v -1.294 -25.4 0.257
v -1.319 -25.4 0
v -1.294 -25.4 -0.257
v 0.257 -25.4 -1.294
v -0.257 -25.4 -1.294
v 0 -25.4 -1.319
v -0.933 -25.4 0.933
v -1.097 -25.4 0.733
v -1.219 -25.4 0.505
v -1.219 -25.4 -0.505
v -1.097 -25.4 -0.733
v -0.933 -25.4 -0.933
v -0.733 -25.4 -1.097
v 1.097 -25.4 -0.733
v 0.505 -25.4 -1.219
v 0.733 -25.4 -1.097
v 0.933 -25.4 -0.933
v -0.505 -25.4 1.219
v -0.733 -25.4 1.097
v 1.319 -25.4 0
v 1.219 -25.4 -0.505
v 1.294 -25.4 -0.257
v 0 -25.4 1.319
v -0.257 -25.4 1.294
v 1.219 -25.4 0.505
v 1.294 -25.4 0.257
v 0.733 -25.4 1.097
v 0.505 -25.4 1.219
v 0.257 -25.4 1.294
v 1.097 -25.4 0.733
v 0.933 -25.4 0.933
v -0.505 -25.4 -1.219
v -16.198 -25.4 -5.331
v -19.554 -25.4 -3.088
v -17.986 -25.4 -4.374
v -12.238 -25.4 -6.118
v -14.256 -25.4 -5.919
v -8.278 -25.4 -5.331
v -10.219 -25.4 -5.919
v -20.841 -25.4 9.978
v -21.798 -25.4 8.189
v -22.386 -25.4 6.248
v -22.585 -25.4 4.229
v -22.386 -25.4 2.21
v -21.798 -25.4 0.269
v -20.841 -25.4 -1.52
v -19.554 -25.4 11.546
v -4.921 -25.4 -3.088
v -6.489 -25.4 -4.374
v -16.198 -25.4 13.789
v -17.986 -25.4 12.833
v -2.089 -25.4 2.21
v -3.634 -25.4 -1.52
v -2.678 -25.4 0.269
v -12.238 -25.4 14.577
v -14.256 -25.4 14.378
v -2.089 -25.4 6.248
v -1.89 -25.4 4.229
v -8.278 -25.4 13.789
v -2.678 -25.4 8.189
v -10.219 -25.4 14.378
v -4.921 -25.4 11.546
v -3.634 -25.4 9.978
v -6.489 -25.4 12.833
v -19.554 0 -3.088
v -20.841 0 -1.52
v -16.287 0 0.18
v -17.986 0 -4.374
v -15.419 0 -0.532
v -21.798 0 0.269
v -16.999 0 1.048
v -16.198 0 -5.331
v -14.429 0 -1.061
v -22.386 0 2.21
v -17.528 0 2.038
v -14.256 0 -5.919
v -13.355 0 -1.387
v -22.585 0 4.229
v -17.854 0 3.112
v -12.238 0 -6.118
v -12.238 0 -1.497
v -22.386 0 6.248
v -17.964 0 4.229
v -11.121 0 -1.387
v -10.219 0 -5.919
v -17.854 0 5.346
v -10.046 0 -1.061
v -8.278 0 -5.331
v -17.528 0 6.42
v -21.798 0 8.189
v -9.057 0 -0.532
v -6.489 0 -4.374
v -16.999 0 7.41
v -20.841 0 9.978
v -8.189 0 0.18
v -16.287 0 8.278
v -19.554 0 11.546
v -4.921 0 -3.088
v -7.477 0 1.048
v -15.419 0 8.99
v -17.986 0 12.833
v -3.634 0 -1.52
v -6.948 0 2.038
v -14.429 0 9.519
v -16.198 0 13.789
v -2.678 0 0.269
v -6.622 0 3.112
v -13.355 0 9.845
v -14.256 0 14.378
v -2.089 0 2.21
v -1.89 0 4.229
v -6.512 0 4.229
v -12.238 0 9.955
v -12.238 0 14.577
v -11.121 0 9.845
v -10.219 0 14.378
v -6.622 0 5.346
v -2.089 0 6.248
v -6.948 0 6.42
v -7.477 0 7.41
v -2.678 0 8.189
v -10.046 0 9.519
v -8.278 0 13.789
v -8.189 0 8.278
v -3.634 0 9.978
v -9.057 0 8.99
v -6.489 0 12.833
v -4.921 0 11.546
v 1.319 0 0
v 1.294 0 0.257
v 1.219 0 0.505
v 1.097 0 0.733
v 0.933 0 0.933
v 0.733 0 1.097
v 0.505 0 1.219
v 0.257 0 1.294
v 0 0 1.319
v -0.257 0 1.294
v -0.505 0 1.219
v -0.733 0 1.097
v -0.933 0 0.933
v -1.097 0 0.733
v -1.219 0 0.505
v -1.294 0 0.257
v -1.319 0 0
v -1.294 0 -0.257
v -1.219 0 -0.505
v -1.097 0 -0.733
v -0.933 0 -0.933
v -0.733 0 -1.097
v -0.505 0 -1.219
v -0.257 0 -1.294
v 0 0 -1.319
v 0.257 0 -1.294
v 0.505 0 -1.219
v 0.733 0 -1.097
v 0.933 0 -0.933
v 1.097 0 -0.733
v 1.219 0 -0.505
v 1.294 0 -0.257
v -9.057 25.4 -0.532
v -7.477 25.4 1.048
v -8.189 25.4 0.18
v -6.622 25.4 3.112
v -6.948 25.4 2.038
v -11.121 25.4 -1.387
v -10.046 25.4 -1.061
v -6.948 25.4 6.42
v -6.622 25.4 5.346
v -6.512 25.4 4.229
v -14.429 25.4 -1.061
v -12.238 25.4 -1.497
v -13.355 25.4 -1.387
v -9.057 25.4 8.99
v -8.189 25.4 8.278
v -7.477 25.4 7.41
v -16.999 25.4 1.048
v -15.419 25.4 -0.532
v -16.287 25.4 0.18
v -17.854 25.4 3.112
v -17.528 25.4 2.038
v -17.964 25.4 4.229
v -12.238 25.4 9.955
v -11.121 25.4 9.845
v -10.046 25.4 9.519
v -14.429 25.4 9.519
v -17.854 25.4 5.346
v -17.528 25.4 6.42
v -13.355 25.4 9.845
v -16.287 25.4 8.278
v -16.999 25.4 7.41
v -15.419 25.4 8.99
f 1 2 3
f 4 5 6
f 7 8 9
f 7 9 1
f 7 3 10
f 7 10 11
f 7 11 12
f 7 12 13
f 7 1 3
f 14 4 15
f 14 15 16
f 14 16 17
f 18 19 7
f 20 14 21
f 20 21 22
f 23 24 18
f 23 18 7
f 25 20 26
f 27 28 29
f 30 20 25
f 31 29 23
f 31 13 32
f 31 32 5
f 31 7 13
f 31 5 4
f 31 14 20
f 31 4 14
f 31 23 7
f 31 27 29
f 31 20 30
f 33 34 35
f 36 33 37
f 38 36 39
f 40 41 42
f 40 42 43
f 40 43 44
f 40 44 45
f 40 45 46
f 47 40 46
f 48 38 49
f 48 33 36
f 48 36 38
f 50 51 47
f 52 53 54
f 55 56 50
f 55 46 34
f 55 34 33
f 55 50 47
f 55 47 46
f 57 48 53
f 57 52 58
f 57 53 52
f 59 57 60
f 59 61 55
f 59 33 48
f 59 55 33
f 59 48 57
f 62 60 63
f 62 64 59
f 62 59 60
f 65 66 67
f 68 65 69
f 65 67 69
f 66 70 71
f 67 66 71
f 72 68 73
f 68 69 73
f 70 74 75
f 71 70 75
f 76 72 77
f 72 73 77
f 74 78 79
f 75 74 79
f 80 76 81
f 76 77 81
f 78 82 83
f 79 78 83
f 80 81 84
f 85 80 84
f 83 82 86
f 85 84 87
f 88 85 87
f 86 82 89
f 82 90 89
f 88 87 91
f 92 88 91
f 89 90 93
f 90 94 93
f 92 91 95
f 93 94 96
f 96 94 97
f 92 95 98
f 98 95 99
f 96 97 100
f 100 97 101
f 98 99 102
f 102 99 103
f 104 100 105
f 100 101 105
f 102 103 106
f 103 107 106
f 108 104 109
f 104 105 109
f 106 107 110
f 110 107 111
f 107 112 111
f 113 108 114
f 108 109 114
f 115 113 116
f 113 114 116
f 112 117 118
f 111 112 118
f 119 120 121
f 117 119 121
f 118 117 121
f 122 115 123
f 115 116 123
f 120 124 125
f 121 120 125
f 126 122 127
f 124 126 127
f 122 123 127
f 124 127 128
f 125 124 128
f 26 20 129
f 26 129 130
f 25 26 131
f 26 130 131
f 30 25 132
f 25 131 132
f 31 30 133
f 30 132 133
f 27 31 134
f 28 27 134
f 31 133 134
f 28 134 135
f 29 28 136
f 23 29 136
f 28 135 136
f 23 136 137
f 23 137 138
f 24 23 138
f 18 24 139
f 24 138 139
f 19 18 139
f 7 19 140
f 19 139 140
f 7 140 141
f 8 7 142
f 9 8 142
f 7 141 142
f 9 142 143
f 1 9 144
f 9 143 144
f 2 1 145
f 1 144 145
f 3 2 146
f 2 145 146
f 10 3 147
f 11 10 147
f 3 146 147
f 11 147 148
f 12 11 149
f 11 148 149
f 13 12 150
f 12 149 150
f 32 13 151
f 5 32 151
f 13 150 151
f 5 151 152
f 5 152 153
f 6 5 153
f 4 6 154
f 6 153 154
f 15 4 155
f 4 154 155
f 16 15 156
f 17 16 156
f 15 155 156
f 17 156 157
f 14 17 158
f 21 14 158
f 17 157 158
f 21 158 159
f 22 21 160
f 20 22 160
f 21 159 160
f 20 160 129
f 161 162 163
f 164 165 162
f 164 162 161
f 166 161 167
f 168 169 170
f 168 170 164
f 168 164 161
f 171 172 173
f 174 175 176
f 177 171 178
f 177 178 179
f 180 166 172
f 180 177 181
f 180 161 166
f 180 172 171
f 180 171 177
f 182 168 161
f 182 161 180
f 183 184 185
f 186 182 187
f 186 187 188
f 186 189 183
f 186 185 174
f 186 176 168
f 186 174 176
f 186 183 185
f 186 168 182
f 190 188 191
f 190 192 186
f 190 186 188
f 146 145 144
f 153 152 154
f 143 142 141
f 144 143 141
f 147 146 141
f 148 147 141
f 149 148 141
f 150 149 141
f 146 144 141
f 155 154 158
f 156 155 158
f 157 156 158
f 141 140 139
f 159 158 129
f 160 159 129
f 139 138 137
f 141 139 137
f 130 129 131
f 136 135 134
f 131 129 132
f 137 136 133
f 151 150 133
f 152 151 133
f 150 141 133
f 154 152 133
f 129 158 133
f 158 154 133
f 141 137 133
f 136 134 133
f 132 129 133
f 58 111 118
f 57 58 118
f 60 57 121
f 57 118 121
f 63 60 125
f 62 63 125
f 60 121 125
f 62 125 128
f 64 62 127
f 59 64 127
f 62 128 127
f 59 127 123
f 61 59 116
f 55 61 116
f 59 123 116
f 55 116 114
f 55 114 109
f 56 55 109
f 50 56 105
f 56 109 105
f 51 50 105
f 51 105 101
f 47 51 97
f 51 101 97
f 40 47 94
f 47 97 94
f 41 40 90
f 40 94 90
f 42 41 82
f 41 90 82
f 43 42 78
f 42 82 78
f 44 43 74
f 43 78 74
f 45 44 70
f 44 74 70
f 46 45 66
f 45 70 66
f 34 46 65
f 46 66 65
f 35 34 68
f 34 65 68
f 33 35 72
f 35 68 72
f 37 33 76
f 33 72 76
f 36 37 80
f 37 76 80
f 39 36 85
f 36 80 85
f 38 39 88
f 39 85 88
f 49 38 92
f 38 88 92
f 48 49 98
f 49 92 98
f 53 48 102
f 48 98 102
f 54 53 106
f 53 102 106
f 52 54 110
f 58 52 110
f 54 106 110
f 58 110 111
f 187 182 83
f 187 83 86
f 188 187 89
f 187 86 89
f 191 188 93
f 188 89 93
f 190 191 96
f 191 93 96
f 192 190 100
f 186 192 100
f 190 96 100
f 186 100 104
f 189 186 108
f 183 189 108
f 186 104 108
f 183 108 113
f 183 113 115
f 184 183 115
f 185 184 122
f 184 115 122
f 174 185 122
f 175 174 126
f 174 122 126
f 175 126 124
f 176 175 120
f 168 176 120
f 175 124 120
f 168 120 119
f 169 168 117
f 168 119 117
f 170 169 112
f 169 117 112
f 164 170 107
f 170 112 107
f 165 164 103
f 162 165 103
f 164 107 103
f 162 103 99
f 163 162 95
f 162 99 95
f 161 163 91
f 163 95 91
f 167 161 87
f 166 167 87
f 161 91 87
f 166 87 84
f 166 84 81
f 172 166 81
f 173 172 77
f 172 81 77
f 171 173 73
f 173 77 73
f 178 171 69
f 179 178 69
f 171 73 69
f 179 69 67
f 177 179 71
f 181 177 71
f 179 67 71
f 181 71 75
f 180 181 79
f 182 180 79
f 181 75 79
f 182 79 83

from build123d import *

# Parameters (mm, degrees)
F0_R     = 1.319098
F0_R_2   = 10.347363
F1_DEPTH = 25.4
F2_R     = 5.726159
F3_DEPTH = 25.4


with BuildPart() as f1:
    # F0 (on Front) → F1 (new body)
    with BuildSketch(Plane.XZ):
        Circle(F0_R)
        with Locations((-12.237806, 4.229143)):
            Circle(F0_R_2)
    extrude(amount=F1_DEPTH)

    # F2 (on face) → F3 (join)
    with BuildSketch(Plane(origin=(0, 0, 0), x_dir=(-1, 0, 0), z_dir=(0, 1, 0))):
        with Locations((12.237806, 4.229143)):
            Circle(F2_R)
    extrude(amount=F3_DEPTH)


solid = f1.part
